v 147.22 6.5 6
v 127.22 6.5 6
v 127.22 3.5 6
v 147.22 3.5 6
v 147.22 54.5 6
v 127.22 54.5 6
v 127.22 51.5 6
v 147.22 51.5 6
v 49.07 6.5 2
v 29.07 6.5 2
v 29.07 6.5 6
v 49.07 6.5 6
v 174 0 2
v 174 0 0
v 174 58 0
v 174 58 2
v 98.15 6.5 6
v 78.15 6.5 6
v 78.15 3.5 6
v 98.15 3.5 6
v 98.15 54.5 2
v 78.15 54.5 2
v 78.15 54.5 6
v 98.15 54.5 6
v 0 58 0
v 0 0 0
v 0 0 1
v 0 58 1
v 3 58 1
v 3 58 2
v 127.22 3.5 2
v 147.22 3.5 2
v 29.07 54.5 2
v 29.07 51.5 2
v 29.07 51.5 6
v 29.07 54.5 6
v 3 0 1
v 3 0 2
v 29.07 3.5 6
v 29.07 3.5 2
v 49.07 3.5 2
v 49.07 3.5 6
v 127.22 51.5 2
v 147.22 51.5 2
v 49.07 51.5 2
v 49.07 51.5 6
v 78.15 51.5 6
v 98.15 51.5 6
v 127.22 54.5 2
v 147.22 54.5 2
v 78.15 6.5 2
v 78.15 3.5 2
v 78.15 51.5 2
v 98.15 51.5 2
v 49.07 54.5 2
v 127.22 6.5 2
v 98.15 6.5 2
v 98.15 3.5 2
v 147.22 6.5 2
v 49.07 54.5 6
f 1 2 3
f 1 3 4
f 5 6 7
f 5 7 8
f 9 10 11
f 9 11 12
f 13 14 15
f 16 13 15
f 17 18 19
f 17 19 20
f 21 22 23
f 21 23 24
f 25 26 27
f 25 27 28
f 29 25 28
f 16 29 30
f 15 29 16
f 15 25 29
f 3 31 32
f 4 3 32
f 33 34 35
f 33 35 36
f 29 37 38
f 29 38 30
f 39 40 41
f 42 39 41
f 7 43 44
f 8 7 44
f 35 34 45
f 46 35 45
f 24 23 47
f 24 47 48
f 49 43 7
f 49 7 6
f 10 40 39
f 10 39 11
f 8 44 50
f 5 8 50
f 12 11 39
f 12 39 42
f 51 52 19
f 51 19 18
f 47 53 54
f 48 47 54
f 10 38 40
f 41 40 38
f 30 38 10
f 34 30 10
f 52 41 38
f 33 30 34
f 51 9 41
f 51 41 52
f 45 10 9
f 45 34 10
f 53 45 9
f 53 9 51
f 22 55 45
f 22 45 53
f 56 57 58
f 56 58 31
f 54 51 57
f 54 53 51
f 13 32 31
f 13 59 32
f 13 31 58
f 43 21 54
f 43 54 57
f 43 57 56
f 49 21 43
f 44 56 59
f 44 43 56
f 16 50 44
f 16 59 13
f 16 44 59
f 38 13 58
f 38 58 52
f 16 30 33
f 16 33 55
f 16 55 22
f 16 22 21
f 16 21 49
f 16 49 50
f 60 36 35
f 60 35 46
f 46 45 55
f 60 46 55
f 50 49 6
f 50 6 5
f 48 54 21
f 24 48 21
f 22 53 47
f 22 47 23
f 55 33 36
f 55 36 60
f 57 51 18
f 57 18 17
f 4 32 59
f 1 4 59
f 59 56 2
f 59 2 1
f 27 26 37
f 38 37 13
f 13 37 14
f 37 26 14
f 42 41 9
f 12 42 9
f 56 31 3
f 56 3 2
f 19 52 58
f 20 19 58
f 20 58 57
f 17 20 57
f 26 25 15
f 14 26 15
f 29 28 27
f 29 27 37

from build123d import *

# Parameters (mm, degrees)
BOX006_W     = 20
BOX006_H     = 3
BOX006_DEPTH = 6
BOX005_W     = 20
BOX005_H     = 3
BOX005_DEPTH = 6
BOX004_W     = 20
BOX004_H     = 3
BOX004_DEPTH = 6
BOX003_W     = 20
BOX003_H     = 3
BOX003_DEPTH = 6
BOX002_W     = 20
BOX002_H     = 3
BOX002_DEPTH = 6
BOX001_W     = 20
BOX001_H     = 3
BOX001_DEPTH = 6
BOX_W        = 171
BOX_H        = 58
BOX_DEPTH    = 2
BOX007_W     = 3
BOX007_H     = 58
BOX007_DEPTH = 1


with BuildPart() as cube006:
    # Box006 → Box006 (new body)
    with BuildSketch(Plane(origin=(127.22, 51.5, 0), x_dir=(1, 0, 0), z_dir=(0, 0, 1))):
        with Locations((10, 1.5)):
            Rectangle(BOX006_W, BOX006_H)
    extrude(amount=BOX006_DEPTH)


with BuildPart() as cube005:
    # Box005 → Box005 (new body)
    with BuildSketch(Plane(origin=(78.15, 51.5, 0), x_dir=(1, 0, 0), z_dir=(0, 0, 1))):
        with Locations((10, 1.5)):
            Rectangle(BOX005_W, BOX005_H)
    extrude(amount=BOX005_DEPTH)


with BuildPart() as cube004:
    # Box004 → Box004 (new body)
    with BuildSketch(Plane(origin=(29.07, 51.5, 0), x_dir=(1, 0, 0), z_dir=(0, 0, 1))):
        with Locations((10, 1.5)):
            Rectangle(BOX004_W, BOX004_H)
    extrude(amount=BOX004_DEPTH)


with BuildPart() as cube003:
    # Box003 → Box003 (new body)
    with BuildSketch(Plane(origin=(127.22, 3.5, 0), x_dir=(1, 0, 0), z_dir=(0, 0, 1))):
        with Locations((10, 1.5)):
            Rectangle(BOX003_W, BOX003_H)
    extrude(amount=BOX003_DEPTH)


with BuildPart() as cube002:
    # Box002 → Box002 (new body)
    with BuildSketch(Plane(origin=(78.15, 3.5, 0), x_dir=(1, 0, 0), z_dir=(0, 0, 1))):
        with Locations((10, 1.5)):
            Rectangle(BOX002_W, BOX002_H)
    extrude(amount=BOX002_DEPTH)


with BuildPart() as cube001:
    # Box001 → Box001 (new body)
    with BuildSketch(Plane(origin=(29.07, 3.5, 0), x_dir=(1, 0, 0), z_dir=(0, 0, 1))):
        with Locations((10, 1.5)):
            Rectangle(BOX001_W, BOX001_H)
    extrude(amount=BOX001_DEPTH)


with BuildPart() as cube:
    # Box → Box (new body)
    with BuildSketch(Plane(origin=(3, 0, 0), x_dir=(1, 0, 0), z_dir=(0, 0, 1))):
        with Locations((85.5, 29)):
            Rectangle(BOX_W, BOX_H)
    extrude(amount=BOX_DEPTH)


with BuildPart() as fusion:
    # Box007 → Box007 (new body)
    with BuildSketch(Plane.XY):
        with Locations((1.5, 29)):
            Rectangle(BOX007_W, BOX007_H)
    extrude(amount=BOX007_DEPTH)

    # Fusion: union Cube006, Cube005, Cube004, Cube003, Cube002, Cube001, Cube
    add(cube006.part)
    add(cube005.part)
    add(cube004.part)
    add(cube003.part)
    add(cube002.part)
    add(cube001.part)
    add(cube.part)


solid = fusion.part
